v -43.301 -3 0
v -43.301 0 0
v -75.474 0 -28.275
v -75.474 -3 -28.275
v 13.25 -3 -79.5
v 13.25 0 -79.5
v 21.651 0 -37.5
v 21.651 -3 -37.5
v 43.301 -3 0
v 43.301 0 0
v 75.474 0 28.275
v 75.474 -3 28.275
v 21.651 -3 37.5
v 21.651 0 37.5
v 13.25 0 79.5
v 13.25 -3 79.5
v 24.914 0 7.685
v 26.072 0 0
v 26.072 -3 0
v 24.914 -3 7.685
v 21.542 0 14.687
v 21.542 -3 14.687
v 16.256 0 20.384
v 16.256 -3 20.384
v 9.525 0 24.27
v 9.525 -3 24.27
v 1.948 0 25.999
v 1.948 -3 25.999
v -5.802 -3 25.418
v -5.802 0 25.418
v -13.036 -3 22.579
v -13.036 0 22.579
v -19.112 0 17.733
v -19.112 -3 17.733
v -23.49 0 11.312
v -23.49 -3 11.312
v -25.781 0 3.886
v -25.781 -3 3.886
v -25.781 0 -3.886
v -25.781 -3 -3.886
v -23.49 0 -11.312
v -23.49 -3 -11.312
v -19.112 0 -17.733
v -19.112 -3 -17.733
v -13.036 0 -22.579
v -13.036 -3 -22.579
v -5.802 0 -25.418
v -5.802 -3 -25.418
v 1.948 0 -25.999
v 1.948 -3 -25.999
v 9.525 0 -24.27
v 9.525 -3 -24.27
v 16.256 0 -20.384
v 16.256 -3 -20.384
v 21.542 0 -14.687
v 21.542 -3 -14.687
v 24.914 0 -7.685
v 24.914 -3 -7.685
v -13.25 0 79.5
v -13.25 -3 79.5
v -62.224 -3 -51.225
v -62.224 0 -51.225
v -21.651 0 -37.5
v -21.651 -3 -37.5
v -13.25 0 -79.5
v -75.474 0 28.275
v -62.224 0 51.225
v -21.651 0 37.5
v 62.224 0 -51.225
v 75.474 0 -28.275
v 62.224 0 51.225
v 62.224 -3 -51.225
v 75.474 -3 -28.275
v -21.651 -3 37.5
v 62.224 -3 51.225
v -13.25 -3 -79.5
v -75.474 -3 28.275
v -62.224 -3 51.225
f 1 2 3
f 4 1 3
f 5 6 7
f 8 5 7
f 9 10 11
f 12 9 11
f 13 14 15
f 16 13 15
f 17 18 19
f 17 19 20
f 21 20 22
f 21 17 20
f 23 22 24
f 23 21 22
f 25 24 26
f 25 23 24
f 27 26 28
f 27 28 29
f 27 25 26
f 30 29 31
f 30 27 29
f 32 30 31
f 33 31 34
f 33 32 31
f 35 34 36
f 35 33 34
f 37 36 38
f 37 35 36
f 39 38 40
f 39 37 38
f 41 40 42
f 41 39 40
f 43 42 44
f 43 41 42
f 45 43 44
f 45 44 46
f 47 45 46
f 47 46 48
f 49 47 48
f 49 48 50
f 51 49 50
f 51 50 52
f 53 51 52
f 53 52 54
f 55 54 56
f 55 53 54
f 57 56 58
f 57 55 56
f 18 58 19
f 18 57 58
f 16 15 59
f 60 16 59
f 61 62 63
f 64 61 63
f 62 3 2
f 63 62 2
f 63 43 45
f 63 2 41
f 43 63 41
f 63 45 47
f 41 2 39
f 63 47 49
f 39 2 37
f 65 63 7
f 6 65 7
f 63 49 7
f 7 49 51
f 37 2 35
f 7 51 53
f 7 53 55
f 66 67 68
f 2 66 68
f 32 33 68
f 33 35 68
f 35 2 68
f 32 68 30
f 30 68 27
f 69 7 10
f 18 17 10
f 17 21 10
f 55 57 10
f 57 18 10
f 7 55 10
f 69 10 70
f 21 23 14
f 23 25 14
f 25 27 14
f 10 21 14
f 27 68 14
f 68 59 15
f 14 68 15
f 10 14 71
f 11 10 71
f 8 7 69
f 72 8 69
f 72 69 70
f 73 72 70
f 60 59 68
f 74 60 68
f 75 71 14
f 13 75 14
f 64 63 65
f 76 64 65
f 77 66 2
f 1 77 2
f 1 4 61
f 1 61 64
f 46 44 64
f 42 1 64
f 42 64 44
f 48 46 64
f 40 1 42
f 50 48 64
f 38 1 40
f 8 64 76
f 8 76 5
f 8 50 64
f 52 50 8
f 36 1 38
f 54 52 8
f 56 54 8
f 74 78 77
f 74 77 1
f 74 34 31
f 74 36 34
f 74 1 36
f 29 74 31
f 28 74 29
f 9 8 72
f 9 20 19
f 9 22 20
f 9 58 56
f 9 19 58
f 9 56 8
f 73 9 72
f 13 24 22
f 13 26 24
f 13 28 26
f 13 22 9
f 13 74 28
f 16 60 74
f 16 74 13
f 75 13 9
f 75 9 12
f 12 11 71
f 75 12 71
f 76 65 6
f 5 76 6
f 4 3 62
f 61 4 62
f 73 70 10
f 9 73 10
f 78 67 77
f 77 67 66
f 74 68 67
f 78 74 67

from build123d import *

# Parameters (mm, degrees)
F0_R     = 26.0720461281
F1_DEPTH = 3


with BuildPart() as f1:
    # F0 (on Front) → F1 (new body)
    with BuildSketch(Plane.XZ):
        Polygon((-13.25, 79.5), (-21.6506350946, 37.5), (0, 37.5), (0, 79.5), align=None)
        Polygon((0, 37.5), (-21.6506350946, 37.5), (-43.3012701892, 0), (-32.4759526419, -18.75), (-21.6506350946, -37.5), (0, -37.5), (21.6506350946, -37.5), (43.3012701892, 0), (21.6506350946, 37.5), align=None)
        Circle(F0_R, mode=Mode.SUBTRACT)
        Polygon((-43.3012701892, 0), (-21.6506350946, 37.5), (-62.2240208464, 51.2248376897), (-75.4740207353, 28.2751644252), align=None)
        Polygon((0, 79.5), (0, 37.5), (21.6506350946, 37.5), (13.25, 79.5), align=None)
        Polygon((-32.4759526419, -18.75), (-43.3012701892, 0), (-75.4740196009, -28.2751633999), (-68.8490196009, -39.75), align=None)
        Polygon((62.2240210561, 51.2248370699), (21.6506350946, 37.5), (43.3012701892, 0), (75.4740211672, 28.2751639337), align=None)
        Polygon((-21.6506350946, -37.5), (-32.4759526419, -18.75), (-68.8490196009, -39.75), (-62.2240196009, -51.2248366001), align=None)
        Polygon((75.4740211672, -28.2751639337), (43.3012701892, 0), (21.6506350946, -37.5), (62.2240210561, -51.2248370699), align=None)
        Polygon((0, -37.5), (-21.6506350946, -37.5), (-13.25, -79.5), (0, -79.5), align=None)
        Polygon((13.25, -79.5), (21.6506350946, -37.5), (0, -37.5), (0, -79.5), align=None)
    extrude(amount=F1_DEPTH)


solid = f1.part
